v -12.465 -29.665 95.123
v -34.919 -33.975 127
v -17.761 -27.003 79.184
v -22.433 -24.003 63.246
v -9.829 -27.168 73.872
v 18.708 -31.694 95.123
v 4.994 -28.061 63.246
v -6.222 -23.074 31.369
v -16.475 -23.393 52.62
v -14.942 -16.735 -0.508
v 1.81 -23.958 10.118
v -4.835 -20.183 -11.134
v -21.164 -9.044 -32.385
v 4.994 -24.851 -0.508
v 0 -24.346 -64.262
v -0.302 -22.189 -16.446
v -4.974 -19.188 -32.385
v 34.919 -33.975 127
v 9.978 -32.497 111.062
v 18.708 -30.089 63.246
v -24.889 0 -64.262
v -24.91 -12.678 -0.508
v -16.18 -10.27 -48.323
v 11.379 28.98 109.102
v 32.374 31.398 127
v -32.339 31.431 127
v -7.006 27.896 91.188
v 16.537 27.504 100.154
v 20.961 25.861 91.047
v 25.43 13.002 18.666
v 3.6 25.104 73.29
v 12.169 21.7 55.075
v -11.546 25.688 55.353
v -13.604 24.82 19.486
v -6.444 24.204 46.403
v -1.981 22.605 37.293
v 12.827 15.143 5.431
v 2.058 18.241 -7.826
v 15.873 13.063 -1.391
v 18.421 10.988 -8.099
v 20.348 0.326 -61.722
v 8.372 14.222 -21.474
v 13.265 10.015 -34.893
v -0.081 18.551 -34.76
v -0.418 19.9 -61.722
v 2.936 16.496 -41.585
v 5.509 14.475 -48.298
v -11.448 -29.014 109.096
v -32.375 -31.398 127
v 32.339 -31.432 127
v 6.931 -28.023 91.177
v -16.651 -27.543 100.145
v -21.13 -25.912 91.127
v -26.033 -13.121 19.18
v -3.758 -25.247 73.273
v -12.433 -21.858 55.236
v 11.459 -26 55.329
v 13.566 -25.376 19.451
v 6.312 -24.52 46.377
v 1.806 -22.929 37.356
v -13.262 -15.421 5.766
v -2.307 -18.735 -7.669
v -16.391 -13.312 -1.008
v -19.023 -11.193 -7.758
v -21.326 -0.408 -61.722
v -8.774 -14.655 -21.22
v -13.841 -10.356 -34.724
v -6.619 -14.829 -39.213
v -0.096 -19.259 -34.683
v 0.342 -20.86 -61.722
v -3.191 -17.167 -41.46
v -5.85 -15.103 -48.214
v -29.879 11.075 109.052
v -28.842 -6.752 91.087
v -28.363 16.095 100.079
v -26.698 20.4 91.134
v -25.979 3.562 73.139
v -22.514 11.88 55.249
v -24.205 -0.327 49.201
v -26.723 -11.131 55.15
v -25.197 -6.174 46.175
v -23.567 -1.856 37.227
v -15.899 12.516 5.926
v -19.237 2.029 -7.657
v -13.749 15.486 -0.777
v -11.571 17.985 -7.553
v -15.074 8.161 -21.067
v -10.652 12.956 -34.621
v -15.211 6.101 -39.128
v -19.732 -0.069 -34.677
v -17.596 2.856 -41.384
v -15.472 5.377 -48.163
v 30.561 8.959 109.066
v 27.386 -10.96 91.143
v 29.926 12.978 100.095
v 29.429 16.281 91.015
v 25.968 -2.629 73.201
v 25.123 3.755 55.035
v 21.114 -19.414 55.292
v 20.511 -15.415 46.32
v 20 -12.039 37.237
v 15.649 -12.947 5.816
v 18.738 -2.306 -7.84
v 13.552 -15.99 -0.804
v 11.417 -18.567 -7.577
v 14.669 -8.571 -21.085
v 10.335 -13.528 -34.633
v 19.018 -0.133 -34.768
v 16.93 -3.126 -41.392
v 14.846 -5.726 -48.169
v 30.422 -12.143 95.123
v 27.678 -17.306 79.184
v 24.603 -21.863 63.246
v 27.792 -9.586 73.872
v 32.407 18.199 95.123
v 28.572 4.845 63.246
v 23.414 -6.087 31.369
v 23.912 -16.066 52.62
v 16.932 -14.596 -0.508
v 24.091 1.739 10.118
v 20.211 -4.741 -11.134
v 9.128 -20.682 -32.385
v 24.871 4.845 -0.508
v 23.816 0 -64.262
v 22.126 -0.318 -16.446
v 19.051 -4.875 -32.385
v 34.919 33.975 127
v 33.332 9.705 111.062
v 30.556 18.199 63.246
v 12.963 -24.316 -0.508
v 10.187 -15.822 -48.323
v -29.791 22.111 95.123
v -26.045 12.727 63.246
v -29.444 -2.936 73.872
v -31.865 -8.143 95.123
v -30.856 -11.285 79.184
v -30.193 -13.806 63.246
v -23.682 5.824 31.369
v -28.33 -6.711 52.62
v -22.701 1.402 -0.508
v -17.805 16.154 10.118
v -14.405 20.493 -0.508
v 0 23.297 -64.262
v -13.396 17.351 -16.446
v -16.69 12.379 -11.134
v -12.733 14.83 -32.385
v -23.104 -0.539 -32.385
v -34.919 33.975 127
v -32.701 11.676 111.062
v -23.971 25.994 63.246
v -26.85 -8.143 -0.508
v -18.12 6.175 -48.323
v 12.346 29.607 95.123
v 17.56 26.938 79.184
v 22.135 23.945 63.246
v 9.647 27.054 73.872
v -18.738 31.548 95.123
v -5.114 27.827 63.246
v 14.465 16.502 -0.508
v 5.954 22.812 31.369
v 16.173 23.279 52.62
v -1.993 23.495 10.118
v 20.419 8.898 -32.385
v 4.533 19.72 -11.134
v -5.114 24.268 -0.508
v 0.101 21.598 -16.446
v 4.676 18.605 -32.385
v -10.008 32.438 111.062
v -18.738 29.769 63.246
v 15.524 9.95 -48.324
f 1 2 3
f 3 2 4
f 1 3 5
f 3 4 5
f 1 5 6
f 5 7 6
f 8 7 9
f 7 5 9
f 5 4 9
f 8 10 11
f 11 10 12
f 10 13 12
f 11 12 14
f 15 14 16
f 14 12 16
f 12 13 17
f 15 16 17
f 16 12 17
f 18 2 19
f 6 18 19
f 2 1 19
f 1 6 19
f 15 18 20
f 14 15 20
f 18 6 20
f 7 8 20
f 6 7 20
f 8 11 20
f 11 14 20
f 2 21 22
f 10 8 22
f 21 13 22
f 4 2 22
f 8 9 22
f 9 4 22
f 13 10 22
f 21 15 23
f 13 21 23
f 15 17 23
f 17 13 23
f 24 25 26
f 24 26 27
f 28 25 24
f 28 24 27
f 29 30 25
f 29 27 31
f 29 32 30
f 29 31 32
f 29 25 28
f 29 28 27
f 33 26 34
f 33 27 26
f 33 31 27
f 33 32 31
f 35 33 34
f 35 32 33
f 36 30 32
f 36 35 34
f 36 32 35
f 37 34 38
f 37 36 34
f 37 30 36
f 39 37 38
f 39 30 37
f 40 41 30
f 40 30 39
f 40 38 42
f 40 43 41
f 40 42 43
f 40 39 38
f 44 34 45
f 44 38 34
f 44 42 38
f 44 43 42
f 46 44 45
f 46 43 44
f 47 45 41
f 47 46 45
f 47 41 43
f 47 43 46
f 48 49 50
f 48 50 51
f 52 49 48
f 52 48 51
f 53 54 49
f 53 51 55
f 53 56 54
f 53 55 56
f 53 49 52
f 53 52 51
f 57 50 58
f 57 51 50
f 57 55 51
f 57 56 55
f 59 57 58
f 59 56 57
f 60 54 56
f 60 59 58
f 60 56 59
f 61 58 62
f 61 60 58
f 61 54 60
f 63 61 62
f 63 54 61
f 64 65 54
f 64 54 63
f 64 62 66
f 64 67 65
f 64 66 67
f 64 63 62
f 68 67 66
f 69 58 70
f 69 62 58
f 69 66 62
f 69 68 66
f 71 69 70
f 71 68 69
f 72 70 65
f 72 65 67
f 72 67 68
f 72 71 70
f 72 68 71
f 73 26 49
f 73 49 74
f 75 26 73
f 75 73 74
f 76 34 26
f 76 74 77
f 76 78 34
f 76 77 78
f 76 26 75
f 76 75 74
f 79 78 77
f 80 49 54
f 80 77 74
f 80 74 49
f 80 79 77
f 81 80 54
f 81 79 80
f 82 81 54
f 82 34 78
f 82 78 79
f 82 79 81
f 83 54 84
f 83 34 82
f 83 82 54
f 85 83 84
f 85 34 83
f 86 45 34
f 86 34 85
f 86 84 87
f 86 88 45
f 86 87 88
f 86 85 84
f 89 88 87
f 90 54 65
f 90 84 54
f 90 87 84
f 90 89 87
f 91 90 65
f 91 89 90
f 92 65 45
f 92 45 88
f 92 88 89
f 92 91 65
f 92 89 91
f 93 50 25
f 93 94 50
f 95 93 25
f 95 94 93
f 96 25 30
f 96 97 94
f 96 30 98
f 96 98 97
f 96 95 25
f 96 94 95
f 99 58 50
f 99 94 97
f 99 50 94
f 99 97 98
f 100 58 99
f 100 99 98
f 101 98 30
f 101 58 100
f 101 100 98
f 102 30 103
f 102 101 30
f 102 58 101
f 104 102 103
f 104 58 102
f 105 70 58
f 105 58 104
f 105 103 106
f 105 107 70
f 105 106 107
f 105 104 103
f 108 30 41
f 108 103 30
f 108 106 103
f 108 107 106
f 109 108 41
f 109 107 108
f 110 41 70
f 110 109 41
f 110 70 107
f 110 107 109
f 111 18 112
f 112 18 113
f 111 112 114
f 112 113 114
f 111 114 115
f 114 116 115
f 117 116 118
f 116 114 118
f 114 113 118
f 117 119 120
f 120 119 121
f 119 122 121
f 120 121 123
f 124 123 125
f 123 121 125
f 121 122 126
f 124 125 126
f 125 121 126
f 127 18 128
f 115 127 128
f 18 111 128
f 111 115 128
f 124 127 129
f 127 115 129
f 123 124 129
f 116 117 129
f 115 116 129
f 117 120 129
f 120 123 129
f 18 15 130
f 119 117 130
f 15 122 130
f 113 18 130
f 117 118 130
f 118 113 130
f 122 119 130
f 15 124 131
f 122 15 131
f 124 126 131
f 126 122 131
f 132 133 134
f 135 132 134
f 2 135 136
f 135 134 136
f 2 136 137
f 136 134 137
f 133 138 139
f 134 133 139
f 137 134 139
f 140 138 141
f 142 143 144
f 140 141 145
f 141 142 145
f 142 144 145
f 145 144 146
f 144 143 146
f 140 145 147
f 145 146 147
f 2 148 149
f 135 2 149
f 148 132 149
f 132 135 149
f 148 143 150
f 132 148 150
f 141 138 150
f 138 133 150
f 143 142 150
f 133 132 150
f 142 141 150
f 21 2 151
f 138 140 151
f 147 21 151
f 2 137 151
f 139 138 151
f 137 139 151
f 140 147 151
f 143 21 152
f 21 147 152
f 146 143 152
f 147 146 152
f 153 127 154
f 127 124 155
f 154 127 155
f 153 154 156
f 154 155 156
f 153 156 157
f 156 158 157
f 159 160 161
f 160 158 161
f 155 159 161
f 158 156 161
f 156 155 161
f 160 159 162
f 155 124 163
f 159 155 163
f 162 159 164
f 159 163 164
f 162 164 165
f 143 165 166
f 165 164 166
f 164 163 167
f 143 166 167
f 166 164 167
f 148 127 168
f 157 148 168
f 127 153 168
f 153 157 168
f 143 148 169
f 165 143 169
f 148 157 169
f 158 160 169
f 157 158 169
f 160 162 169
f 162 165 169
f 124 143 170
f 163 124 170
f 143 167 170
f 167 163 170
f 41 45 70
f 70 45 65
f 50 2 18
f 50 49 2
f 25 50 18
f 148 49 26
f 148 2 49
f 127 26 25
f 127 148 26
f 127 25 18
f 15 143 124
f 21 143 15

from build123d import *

# Parameters (mm, degrees)
F1_W = 69.838352
F1_H = 67.95083
F5_T = -2.54


with BuildPart() as f4:
    # F1 (on offset) → F4 section 0
    with BuildSketch(Plane.XY.offset(127)):
        Rectangle(F1_W, F1_H)
    # F3 (on offset) → F4 section 1
    with BuildSketch(Plane.XY.offset(-64.262)):
        Polygon((0, 23.29665), (-24.888797, 0), (0, -24.346344), (23.815714, 0), align=None)
    loft()

    # F5
    f5_openings = [f4.faces().sort_by_distance(p)[0] for p in [
        (0, 0, 127),
    ]]
    offset(amount=F5_T, openings=f5_openings)


solid = f4.part
